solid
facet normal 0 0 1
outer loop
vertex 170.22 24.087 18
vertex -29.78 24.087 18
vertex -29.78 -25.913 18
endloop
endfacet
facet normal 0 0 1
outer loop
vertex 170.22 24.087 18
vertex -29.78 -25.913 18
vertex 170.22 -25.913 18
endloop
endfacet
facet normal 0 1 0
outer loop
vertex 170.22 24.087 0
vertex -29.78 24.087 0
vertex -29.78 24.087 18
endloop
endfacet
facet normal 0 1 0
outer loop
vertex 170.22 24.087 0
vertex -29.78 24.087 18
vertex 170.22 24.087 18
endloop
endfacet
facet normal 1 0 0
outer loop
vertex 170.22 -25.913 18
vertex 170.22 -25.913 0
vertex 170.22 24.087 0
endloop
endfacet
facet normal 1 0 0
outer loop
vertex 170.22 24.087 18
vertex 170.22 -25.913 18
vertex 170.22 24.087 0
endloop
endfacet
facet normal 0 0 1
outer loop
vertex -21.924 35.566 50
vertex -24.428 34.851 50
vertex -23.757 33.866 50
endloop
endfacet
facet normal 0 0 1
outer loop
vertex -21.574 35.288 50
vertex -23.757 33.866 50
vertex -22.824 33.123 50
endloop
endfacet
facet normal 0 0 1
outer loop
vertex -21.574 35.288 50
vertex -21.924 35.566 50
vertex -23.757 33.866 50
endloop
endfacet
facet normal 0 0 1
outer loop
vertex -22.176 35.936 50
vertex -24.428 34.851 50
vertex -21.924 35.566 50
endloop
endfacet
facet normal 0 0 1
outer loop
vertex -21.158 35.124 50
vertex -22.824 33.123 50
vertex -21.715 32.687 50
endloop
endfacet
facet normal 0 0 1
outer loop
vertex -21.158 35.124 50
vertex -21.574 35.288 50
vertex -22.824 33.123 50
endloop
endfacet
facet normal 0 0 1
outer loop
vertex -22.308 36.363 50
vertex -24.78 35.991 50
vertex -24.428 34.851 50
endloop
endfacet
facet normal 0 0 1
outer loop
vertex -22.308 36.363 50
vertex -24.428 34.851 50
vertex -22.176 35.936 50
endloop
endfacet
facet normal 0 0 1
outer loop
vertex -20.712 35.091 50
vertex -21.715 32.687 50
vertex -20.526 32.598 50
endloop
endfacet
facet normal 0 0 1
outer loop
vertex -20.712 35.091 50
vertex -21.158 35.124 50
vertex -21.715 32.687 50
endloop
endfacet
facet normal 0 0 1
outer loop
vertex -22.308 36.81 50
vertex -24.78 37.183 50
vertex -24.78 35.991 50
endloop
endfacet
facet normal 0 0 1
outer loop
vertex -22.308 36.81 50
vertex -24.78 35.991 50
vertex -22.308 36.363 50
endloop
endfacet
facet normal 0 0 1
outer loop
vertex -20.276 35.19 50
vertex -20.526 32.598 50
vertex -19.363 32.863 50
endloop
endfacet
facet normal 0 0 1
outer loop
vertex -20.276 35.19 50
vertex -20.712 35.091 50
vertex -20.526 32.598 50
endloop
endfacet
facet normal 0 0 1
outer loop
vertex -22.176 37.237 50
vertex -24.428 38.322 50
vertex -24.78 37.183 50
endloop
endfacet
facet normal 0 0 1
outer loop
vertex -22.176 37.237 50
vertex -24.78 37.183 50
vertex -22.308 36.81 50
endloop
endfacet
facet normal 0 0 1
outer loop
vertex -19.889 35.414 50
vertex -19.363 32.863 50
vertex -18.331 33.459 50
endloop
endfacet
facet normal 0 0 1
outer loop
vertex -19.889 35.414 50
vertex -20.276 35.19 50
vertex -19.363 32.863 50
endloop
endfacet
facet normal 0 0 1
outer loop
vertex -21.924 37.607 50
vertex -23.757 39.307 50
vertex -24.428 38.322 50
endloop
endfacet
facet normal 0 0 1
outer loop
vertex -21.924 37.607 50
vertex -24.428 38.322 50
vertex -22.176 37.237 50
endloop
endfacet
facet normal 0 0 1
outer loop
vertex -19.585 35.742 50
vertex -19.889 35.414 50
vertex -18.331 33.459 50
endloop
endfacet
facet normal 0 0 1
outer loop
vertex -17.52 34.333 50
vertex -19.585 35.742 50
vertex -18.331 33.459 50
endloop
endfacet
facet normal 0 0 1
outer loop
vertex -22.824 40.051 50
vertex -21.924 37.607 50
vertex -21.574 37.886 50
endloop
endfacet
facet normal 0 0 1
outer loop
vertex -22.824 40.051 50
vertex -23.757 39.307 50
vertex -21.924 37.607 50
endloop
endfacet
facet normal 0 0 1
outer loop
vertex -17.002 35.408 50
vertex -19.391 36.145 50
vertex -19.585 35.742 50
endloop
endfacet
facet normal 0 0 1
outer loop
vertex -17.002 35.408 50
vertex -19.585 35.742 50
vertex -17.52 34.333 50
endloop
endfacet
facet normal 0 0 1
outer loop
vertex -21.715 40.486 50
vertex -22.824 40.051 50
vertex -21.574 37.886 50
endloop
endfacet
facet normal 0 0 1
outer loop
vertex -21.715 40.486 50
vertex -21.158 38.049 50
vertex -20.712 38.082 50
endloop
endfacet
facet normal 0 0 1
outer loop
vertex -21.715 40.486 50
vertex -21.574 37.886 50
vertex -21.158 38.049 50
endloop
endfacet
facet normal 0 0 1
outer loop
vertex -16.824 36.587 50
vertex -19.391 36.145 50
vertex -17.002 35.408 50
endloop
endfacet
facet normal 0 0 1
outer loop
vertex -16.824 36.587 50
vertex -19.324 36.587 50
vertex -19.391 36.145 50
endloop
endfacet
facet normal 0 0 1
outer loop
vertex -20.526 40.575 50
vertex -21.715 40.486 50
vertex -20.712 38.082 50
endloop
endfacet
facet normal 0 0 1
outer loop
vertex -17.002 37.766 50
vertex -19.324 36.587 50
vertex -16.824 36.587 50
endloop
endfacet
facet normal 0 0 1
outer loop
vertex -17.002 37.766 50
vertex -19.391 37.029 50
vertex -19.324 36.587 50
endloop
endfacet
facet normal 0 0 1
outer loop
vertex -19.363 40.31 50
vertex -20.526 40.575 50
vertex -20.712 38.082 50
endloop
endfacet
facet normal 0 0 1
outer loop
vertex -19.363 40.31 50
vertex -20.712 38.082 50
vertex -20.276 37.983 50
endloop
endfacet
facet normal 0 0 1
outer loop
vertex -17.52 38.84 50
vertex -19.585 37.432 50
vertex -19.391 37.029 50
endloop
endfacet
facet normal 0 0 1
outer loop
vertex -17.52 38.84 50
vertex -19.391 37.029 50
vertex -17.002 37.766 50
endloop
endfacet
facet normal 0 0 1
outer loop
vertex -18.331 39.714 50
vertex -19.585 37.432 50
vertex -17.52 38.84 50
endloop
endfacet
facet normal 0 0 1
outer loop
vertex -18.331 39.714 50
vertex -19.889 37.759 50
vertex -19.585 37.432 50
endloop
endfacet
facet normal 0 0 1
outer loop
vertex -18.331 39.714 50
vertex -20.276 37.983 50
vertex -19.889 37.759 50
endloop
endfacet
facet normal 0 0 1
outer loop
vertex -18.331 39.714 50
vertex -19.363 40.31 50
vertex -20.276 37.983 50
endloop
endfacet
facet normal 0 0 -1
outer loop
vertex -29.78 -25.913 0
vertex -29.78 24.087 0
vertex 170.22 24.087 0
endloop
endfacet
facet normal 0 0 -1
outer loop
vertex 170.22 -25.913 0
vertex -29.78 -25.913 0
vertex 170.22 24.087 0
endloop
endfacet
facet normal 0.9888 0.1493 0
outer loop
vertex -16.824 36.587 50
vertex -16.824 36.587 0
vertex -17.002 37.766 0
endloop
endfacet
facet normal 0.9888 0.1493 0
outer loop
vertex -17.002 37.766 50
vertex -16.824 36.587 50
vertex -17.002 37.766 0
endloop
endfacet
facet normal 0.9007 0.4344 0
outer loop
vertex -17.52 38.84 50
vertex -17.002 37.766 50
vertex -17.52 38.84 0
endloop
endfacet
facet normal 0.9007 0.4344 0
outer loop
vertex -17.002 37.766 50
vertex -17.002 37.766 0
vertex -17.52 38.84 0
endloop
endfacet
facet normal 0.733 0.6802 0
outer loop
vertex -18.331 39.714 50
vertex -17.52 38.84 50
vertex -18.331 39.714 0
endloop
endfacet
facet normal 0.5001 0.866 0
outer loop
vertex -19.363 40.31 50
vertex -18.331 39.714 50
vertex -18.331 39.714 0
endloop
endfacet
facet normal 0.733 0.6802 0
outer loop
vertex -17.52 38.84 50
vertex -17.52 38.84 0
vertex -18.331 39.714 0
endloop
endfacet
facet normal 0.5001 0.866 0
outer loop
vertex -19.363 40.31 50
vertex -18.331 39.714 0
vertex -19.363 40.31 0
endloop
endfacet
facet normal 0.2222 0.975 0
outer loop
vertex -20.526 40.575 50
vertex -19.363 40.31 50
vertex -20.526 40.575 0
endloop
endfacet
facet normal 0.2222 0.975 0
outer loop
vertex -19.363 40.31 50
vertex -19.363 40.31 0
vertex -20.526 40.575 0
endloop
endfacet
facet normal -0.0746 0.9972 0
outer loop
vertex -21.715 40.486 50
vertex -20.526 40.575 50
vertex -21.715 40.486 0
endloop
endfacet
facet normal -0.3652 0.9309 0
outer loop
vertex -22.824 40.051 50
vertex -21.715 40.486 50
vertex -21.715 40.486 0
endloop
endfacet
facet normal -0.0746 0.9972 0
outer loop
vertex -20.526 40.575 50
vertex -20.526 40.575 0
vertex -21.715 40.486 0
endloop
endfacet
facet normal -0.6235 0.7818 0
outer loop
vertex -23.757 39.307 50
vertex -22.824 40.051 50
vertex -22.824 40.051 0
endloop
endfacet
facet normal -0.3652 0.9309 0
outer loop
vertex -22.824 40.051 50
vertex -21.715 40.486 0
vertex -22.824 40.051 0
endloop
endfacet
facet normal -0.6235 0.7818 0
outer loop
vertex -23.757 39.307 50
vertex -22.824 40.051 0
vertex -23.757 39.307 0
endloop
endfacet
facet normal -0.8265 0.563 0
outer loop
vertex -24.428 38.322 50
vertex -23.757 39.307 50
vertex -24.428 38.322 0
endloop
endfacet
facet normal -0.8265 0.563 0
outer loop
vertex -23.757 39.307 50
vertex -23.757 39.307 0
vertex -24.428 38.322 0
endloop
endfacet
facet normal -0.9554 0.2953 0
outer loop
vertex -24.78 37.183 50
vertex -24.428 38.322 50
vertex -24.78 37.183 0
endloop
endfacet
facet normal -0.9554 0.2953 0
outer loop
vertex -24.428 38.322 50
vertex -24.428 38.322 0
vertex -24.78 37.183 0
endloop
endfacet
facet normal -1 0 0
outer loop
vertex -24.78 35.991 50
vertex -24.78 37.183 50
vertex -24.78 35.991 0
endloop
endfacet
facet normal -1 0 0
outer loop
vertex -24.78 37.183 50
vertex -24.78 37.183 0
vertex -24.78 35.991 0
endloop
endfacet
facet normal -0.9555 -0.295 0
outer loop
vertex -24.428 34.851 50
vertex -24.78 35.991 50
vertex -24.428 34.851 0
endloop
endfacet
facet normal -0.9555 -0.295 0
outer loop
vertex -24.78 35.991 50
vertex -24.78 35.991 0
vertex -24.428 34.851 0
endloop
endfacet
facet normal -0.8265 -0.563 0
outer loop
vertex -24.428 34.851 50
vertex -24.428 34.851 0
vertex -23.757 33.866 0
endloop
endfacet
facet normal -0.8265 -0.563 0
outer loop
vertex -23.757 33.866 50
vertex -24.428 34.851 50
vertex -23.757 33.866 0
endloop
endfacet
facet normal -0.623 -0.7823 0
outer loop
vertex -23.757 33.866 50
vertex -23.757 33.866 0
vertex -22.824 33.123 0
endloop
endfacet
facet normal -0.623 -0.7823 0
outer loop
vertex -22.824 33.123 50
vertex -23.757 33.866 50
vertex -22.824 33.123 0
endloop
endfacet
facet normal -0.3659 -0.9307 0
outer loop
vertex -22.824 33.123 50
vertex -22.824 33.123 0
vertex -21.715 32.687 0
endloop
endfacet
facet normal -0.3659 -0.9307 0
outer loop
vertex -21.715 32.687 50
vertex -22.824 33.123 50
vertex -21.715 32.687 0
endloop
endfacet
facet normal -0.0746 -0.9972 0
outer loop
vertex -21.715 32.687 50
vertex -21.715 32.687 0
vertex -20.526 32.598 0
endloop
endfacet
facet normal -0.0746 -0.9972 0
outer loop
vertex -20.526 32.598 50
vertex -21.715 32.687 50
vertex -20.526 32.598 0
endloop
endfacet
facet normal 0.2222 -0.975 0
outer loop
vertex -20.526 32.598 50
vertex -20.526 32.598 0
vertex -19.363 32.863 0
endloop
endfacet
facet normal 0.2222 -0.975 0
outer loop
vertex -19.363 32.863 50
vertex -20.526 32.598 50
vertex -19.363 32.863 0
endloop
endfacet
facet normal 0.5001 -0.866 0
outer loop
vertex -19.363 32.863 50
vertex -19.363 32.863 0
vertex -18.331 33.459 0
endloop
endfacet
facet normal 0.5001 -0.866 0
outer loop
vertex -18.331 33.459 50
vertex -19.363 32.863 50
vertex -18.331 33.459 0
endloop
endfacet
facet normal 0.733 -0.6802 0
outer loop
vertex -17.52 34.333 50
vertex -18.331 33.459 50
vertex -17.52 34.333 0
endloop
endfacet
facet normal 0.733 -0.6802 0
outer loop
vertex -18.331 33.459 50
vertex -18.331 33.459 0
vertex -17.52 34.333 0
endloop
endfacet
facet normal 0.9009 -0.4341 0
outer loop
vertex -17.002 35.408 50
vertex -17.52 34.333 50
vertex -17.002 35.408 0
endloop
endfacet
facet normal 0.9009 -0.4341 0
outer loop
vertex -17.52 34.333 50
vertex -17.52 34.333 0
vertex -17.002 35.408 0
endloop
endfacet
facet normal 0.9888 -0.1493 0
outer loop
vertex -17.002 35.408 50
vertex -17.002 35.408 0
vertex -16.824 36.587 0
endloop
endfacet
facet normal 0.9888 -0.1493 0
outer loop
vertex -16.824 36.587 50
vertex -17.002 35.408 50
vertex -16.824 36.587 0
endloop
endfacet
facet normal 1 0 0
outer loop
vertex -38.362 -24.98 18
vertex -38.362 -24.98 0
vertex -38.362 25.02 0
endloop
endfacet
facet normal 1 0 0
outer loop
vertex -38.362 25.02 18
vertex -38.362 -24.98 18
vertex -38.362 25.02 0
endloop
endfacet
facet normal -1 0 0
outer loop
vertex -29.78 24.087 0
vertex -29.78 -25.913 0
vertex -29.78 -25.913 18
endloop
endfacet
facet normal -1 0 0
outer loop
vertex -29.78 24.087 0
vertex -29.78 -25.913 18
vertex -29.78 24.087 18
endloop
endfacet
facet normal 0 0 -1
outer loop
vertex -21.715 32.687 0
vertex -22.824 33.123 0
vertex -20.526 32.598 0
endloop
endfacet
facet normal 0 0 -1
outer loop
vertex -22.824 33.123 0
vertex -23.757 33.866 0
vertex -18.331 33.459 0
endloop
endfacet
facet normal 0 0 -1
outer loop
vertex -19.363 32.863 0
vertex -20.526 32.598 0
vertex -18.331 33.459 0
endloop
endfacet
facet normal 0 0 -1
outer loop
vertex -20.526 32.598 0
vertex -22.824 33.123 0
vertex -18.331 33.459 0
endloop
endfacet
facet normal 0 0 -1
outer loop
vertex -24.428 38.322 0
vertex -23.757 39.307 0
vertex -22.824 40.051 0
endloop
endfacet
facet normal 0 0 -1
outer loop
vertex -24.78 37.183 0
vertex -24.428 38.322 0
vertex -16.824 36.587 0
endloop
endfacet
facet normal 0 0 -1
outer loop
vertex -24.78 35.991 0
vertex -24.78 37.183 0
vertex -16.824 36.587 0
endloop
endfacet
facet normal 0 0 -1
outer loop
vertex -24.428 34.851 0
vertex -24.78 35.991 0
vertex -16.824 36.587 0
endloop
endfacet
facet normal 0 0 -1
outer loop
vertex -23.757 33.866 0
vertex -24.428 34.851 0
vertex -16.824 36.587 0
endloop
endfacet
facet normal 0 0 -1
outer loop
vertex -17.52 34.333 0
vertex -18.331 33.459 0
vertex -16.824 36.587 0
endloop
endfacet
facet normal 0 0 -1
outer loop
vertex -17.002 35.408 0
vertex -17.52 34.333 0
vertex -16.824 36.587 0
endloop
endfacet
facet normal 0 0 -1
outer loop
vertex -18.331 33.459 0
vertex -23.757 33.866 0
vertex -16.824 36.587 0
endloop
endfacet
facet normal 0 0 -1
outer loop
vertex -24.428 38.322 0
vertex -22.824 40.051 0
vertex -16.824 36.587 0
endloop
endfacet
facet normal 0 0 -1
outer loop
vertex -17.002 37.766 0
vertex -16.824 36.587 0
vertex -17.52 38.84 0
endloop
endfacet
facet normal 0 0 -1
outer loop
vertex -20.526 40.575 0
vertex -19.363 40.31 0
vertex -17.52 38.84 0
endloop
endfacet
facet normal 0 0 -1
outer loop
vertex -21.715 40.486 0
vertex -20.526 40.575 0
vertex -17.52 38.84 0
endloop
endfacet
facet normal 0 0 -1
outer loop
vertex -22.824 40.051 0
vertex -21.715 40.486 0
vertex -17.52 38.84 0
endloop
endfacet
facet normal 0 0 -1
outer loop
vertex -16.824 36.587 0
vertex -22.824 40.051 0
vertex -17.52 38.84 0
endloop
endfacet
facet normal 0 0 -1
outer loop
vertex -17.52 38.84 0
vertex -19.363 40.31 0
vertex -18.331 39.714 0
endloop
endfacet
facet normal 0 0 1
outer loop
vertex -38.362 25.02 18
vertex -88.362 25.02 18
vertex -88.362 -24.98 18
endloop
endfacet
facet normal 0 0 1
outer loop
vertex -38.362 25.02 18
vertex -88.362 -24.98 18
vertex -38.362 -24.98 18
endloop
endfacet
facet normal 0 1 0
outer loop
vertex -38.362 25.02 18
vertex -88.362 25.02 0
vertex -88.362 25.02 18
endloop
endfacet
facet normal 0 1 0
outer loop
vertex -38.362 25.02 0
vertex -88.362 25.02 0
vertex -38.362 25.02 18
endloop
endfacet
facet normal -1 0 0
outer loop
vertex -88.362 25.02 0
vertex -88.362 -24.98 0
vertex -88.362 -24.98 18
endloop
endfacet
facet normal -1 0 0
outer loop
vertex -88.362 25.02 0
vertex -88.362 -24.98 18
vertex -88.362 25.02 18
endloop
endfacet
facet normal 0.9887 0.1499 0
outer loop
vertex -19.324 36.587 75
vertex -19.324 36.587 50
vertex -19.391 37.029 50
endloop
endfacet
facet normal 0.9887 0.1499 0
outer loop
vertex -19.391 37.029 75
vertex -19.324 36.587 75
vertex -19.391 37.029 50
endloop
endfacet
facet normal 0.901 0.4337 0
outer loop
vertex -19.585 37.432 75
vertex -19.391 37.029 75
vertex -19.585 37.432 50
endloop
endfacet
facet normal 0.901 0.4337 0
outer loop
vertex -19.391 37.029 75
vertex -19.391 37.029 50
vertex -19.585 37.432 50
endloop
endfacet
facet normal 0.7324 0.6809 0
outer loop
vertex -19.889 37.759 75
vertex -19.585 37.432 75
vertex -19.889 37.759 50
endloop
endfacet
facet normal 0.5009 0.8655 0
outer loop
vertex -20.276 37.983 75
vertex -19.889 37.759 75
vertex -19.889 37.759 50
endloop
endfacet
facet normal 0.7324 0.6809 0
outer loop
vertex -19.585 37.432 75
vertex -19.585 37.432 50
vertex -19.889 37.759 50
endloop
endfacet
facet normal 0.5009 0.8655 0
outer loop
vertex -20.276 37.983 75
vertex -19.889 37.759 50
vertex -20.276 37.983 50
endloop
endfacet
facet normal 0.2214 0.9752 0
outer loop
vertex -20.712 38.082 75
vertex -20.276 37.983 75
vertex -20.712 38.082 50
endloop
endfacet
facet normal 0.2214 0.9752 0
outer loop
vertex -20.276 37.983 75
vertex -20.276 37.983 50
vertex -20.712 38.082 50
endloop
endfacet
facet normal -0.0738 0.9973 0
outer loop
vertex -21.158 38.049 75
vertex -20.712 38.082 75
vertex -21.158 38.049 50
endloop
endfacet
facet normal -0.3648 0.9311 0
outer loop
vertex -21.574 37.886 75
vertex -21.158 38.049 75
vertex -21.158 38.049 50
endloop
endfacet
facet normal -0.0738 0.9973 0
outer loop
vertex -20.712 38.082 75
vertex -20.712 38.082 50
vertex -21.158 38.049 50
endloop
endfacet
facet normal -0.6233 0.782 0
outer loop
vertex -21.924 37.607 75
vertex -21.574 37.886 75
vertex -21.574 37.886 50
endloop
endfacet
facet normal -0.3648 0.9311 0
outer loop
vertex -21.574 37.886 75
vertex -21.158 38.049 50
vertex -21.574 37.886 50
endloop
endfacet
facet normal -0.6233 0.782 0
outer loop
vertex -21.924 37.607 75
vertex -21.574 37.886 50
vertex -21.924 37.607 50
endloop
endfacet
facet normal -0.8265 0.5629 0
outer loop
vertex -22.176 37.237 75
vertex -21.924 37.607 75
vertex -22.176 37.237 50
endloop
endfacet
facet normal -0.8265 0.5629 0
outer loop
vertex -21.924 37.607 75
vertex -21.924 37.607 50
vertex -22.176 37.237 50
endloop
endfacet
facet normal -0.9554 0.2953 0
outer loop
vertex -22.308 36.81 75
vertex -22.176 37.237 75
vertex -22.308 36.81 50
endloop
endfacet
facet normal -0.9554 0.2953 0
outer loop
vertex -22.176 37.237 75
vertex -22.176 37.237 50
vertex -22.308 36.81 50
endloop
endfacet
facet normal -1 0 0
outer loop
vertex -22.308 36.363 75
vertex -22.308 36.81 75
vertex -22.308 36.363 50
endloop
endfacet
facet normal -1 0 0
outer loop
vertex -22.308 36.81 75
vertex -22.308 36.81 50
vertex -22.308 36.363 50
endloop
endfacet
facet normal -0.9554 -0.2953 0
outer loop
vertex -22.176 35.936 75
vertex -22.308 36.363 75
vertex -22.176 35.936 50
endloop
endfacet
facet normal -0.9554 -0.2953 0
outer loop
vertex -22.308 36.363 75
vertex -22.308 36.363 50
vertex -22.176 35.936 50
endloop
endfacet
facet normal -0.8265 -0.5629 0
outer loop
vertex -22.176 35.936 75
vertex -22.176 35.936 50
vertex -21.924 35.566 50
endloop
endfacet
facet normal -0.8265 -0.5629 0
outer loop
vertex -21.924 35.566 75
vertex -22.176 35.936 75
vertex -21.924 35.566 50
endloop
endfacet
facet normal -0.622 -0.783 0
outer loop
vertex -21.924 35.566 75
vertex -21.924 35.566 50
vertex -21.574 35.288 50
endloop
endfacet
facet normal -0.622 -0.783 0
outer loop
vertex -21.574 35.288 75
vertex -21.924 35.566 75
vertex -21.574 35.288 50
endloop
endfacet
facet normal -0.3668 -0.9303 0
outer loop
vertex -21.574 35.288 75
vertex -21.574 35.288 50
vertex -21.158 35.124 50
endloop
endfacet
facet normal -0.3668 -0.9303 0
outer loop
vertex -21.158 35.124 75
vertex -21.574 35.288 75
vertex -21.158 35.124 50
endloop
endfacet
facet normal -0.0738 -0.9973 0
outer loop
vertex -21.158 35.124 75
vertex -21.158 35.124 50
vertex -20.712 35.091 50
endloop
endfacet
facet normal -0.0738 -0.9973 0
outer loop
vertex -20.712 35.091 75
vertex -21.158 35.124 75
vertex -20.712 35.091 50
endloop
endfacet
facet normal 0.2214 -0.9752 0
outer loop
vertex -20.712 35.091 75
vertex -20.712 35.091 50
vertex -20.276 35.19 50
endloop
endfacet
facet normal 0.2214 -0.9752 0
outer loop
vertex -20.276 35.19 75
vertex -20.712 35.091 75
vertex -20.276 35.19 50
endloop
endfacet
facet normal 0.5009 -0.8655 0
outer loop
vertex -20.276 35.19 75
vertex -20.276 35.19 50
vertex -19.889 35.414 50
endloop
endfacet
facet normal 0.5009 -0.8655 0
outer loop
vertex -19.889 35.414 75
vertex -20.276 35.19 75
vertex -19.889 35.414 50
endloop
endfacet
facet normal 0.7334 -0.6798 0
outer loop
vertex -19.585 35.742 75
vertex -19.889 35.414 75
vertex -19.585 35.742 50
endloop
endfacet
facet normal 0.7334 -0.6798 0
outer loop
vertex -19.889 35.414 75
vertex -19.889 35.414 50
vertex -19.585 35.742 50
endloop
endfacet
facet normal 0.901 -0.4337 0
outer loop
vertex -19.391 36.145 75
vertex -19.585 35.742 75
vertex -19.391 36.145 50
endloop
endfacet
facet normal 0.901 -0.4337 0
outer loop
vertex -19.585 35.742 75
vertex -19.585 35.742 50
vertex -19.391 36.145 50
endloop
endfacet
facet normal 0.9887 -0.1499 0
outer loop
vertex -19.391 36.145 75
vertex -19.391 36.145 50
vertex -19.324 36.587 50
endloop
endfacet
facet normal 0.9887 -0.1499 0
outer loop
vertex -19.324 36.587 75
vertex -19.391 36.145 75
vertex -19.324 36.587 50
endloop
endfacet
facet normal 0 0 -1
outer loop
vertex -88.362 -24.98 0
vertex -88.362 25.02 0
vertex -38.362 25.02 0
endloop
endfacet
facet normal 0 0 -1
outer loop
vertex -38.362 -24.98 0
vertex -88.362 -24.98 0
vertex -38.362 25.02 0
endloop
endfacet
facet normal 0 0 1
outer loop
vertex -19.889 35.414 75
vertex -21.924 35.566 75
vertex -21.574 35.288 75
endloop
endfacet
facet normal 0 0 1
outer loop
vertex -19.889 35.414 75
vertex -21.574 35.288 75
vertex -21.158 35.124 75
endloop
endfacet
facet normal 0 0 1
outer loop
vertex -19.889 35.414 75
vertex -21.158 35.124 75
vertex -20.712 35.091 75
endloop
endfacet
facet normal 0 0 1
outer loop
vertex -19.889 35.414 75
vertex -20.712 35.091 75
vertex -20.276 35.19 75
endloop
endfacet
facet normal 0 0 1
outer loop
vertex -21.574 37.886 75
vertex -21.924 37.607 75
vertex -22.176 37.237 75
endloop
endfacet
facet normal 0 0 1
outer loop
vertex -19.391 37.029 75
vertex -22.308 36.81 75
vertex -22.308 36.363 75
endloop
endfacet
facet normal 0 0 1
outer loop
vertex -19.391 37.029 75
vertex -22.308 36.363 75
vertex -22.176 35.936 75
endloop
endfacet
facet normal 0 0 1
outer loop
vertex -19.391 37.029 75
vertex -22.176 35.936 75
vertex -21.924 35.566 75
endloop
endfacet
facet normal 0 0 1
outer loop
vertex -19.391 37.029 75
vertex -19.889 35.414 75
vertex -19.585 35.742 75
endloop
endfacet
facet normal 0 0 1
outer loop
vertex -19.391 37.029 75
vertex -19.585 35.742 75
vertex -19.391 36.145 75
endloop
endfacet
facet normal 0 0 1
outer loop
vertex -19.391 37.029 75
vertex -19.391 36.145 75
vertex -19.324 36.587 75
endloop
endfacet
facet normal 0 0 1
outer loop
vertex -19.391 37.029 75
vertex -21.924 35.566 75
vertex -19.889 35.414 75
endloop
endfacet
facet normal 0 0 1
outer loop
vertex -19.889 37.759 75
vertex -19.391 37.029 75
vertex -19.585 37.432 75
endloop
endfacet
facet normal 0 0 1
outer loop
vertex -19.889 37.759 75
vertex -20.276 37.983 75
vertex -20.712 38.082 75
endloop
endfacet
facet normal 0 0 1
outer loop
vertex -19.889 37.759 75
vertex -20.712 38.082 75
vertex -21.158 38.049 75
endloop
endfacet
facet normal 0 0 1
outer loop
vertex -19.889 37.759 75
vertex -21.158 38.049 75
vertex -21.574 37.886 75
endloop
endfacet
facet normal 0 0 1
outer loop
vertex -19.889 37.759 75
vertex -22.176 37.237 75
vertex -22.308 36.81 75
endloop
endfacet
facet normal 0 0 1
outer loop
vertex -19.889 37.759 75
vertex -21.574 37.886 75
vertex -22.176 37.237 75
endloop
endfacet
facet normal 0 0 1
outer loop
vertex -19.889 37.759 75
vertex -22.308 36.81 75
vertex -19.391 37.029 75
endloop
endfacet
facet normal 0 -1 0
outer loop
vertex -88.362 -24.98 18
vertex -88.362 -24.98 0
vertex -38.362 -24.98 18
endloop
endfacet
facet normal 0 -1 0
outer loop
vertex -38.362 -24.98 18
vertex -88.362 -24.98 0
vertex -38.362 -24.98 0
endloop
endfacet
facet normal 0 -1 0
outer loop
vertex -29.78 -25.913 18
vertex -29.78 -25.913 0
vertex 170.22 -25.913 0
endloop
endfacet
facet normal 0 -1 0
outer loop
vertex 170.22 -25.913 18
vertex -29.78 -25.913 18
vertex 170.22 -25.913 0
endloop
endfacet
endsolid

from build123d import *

# Parameters (mm, degrees)
F0_R     = 4
F1_DEPTH = 50
F0_W     = 200
F0_H     = 50
F0_W_2   = 50
F2_DEPTH = 18
F3_R     = 1.5
F4_DEPTH = 25


with BuildPart() as f1:
    # F0 (on Top) → F1 (new body)
    with BuildSketch(Plane.XY):
        with Locations((-20.824478, 36.586671)):
            Circle(F0_R)
    extrude(amount=F1_DEPTH)

    # F3 (on face) → F4 (join)
    with BuildSketch(Plane.XY.offset(50)):
        with Locations((-20.824478, 36.586671)):
            Circle(F3_R)
    extrude(amount=F4_DEPTH)


with BuildPart() as f2:
    # F0 (on Top) → F2 (new body)
    with BuildSketch(Plane.XY):
        with Locations((70.220298, -0.913329)):
            Rectangle(F0_W, F0_H)
        with Locations((-63.361793, 0.019506)):
            Rectangle(F0_W_2, F0_H)
    extrude(amount=F2_DEPTH)


solid = Compound([f1.part, f2.part])
